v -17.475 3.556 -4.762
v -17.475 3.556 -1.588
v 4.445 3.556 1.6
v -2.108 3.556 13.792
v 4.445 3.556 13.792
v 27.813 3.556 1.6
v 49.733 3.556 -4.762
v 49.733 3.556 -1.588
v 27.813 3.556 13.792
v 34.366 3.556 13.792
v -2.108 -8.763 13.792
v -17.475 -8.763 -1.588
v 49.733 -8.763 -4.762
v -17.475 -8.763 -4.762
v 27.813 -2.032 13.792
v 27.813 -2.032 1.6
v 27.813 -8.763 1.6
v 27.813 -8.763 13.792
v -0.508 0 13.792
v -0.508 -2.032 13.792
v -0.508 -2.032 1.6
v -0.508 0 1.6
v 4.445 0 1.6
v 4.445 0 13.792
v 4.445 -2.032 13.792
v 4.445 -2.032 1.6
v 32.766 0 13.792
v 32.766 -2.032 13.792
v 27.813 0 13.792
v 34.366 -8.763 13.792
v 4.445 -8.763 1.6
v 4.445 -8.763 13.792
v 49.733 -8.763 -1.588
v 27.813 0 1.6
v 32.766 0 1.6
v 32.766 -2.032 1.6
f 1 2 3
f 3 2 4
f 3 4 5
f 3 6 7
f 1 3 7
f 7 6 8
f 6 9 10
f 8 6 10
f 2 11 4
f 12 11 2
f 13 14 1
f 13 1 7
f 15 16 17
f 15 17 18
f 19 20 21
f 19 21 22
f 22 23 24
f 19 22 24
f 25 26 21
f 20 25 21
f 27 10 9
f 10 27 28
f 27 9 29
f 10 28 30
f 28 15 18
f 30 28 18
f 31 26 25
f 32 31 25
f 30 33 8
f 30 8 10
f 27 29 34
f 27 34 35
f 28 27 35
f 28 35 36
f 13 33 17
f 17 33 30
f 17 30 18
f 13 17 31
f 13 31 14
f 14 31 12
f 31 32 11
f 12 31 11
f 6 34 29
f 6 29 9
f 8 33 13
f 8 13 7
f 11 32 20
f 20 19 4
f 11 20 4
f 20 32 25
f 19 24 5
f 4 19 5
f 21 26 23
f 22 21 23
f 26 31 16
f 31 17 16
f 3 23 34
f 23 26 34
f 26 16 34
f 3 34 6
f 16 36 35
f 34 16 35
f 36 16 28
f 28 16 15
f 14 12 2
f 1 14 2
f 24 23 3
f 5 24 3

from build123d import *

# Parameters (mm, degrees)
F0_W      = 4.572
F0_H      = 2.032
F1_DEPTH  = 1.6
F3_DEPTH  = 12.192
F4_DEPTH  = 3.175
F5_DEPTH  = 0.508
F6_DEPTH  = 0.508
F7_DEPTH  = 0.508
F8_DEPTH  = 0.508
F9_DEPTH  = 0.127
F11_DEPTH = 1.5875
F13_DEPTH = 12.319
F14_DEPTH = 3.175


# Not quite as in the source:
# - a feature of the source that left no trace in its solid (it failed there, or was rolled back) is left out
# - a pattern or mirror of a feature is missing from the dataset's text; its kind, count and spacing are read off the source's solid


with BuildPart() as f1:
    # F0 (on Top) → F1 (new body)
    with BuildSketch(Plane.XY):
        Polygon((0, -2.032), (0, 0), (4.572, 0), (4.572, 3.556), (-1.6, 3.556), (-1.6, -1.016), (-1.6, -5.588), (4.572, -5.588), (4.572, -2.032), align=None)
        Polygon((33.858, 3.556), (27.686, 3.556), (27.686, 0), (32.258, 0), (32.258, -2.032), (27.686, -2.032), (27.686, -5.588), (33.858, -5.588), (33.858, -1.016), align=None)
        Polygon((4.572, 3.556), (4.572, 0), (4.572, -2.032), (4.572, -5.588), (27.686, -5.588), (27.686, -2.032), (27.686, 0), (27.686, 3.556), align=None)
        with Locations((2.286, -1.016)):
            Rectangle(F0_W, F0_H)
        with Locations((29.972, -1.016)):
            Rectangle(F0_W, F0_H)
    extrude(amount=F1_DEPTH)

    # F2 (on face) → F3 (join)
    with BuildSketch(Plane.XY.offset(1.6)):
        Polygon((0, -2.032), (0, 0), (4.572, 0), (4.572, 3.556), (-1.6, 3.556), (-1.6, -1.016), (-1.6, -5.588), (4.572, -5.588), (4.572, -2.032), align=None)
        Polygon((33.858, 3.556), (27.686, 3.556), (27.686, 0), (32.258, 0), (32.258, -2.032), (27.686, -2.032), (27.686, -5.588), (33.858, -5.588), (33.858, -1.016), align=None)
    extrude(amount=F3_DEPTH)

    # F4 (add): a face of the model
    f4_faces = [f1.faces().sort_by_distance(p)[0] for p in [
        (-1.2195411943, -5.588, 6.896),
    ]]
    extrude(f4_faces, amount=F4_DEPTH)

    # F5 (add): a face of the model
    f5_faces = [f1.faces().sort_by_distance(p)[0] for p in [
        (-1.6, -2.6035, 6.896),
    ]]
    extrude(f5_faces, amount=F5_DEPTH)

    # F6 (cut): a face of the model
    f6_faces = [f1.faces().sort_by_distance(p)[0] for p in [
        (0, -1.016, 7.696),
    ]]
    extrude(f6_faces, amount=-F6_DEPTH, mode=Mode.SUBTRACT)

    # F7 (add): a face of the model
    f7_faces = [f1.faces().sort_by_distance(p)[0] for p in [
        (33.858, -2.6035, 6.896),
    ]]
    extrude(f7_faces, amount=F7_DEPTH)

    # F8 (cut): a face of the model
    f8_faces = [f1.faces().sort_by_distance(p)[0] for p in [
        (32.258, -1.016, 7.696),
    ]]
    extrude(f8_faces, amount=-F8_DEPTH, mode=Mode.SUBTRACT)

    # F9 (cut): faces of the model
    f9_faces = [f1.faces().sort_by_distance(p)[0] for p in [
        (4.572, -5.3975, 7.696),
        (4.572, 1.778, 7.696),
    ]]
    f9 = extrude(f9_faces, amount=-F9_DEPTH, mode=Mode.SUBTRACT)

    # F9_copies: F9 across plane
    add(f9.mirror(Plane(origin=(16.129, 0, 0), x_dir=(0, 0, 1), z_dir=(1, 0, 0))), mode=Mode.SUBTRACT)

    # F11 (add): a face of the model
    f11_faces = [f1.faces().sort_by_distance(p)[0] for p in [
        (16.129, -2.6035, 0),
    ]]
    extrude(f11_faces, amount=F11_DEPTH)

    # F12 (on face) → F13 (join, through all)
    with BuildSketch(Plane.XZ.offset(8.763)):
        Polygon((-2.108, -1.5875), (-2.108, 13.792), (-17.475, -1.5875), align=None)
        Polygon((49.733, -1.5875), (34.366, 13.792), (34.366, -1.5875), align=None)
    extrude(amount=-F13_DEPTH)

    # F14 (add): a face of the model
    f14_faces = [f1.faces().sort_by_distance(p)[0] for p in [
        (16.129, -2.6035, -1.5875),
    ]]
    extrude(f14_faces, amount=F14_DEPTH)


solid = f1.part
